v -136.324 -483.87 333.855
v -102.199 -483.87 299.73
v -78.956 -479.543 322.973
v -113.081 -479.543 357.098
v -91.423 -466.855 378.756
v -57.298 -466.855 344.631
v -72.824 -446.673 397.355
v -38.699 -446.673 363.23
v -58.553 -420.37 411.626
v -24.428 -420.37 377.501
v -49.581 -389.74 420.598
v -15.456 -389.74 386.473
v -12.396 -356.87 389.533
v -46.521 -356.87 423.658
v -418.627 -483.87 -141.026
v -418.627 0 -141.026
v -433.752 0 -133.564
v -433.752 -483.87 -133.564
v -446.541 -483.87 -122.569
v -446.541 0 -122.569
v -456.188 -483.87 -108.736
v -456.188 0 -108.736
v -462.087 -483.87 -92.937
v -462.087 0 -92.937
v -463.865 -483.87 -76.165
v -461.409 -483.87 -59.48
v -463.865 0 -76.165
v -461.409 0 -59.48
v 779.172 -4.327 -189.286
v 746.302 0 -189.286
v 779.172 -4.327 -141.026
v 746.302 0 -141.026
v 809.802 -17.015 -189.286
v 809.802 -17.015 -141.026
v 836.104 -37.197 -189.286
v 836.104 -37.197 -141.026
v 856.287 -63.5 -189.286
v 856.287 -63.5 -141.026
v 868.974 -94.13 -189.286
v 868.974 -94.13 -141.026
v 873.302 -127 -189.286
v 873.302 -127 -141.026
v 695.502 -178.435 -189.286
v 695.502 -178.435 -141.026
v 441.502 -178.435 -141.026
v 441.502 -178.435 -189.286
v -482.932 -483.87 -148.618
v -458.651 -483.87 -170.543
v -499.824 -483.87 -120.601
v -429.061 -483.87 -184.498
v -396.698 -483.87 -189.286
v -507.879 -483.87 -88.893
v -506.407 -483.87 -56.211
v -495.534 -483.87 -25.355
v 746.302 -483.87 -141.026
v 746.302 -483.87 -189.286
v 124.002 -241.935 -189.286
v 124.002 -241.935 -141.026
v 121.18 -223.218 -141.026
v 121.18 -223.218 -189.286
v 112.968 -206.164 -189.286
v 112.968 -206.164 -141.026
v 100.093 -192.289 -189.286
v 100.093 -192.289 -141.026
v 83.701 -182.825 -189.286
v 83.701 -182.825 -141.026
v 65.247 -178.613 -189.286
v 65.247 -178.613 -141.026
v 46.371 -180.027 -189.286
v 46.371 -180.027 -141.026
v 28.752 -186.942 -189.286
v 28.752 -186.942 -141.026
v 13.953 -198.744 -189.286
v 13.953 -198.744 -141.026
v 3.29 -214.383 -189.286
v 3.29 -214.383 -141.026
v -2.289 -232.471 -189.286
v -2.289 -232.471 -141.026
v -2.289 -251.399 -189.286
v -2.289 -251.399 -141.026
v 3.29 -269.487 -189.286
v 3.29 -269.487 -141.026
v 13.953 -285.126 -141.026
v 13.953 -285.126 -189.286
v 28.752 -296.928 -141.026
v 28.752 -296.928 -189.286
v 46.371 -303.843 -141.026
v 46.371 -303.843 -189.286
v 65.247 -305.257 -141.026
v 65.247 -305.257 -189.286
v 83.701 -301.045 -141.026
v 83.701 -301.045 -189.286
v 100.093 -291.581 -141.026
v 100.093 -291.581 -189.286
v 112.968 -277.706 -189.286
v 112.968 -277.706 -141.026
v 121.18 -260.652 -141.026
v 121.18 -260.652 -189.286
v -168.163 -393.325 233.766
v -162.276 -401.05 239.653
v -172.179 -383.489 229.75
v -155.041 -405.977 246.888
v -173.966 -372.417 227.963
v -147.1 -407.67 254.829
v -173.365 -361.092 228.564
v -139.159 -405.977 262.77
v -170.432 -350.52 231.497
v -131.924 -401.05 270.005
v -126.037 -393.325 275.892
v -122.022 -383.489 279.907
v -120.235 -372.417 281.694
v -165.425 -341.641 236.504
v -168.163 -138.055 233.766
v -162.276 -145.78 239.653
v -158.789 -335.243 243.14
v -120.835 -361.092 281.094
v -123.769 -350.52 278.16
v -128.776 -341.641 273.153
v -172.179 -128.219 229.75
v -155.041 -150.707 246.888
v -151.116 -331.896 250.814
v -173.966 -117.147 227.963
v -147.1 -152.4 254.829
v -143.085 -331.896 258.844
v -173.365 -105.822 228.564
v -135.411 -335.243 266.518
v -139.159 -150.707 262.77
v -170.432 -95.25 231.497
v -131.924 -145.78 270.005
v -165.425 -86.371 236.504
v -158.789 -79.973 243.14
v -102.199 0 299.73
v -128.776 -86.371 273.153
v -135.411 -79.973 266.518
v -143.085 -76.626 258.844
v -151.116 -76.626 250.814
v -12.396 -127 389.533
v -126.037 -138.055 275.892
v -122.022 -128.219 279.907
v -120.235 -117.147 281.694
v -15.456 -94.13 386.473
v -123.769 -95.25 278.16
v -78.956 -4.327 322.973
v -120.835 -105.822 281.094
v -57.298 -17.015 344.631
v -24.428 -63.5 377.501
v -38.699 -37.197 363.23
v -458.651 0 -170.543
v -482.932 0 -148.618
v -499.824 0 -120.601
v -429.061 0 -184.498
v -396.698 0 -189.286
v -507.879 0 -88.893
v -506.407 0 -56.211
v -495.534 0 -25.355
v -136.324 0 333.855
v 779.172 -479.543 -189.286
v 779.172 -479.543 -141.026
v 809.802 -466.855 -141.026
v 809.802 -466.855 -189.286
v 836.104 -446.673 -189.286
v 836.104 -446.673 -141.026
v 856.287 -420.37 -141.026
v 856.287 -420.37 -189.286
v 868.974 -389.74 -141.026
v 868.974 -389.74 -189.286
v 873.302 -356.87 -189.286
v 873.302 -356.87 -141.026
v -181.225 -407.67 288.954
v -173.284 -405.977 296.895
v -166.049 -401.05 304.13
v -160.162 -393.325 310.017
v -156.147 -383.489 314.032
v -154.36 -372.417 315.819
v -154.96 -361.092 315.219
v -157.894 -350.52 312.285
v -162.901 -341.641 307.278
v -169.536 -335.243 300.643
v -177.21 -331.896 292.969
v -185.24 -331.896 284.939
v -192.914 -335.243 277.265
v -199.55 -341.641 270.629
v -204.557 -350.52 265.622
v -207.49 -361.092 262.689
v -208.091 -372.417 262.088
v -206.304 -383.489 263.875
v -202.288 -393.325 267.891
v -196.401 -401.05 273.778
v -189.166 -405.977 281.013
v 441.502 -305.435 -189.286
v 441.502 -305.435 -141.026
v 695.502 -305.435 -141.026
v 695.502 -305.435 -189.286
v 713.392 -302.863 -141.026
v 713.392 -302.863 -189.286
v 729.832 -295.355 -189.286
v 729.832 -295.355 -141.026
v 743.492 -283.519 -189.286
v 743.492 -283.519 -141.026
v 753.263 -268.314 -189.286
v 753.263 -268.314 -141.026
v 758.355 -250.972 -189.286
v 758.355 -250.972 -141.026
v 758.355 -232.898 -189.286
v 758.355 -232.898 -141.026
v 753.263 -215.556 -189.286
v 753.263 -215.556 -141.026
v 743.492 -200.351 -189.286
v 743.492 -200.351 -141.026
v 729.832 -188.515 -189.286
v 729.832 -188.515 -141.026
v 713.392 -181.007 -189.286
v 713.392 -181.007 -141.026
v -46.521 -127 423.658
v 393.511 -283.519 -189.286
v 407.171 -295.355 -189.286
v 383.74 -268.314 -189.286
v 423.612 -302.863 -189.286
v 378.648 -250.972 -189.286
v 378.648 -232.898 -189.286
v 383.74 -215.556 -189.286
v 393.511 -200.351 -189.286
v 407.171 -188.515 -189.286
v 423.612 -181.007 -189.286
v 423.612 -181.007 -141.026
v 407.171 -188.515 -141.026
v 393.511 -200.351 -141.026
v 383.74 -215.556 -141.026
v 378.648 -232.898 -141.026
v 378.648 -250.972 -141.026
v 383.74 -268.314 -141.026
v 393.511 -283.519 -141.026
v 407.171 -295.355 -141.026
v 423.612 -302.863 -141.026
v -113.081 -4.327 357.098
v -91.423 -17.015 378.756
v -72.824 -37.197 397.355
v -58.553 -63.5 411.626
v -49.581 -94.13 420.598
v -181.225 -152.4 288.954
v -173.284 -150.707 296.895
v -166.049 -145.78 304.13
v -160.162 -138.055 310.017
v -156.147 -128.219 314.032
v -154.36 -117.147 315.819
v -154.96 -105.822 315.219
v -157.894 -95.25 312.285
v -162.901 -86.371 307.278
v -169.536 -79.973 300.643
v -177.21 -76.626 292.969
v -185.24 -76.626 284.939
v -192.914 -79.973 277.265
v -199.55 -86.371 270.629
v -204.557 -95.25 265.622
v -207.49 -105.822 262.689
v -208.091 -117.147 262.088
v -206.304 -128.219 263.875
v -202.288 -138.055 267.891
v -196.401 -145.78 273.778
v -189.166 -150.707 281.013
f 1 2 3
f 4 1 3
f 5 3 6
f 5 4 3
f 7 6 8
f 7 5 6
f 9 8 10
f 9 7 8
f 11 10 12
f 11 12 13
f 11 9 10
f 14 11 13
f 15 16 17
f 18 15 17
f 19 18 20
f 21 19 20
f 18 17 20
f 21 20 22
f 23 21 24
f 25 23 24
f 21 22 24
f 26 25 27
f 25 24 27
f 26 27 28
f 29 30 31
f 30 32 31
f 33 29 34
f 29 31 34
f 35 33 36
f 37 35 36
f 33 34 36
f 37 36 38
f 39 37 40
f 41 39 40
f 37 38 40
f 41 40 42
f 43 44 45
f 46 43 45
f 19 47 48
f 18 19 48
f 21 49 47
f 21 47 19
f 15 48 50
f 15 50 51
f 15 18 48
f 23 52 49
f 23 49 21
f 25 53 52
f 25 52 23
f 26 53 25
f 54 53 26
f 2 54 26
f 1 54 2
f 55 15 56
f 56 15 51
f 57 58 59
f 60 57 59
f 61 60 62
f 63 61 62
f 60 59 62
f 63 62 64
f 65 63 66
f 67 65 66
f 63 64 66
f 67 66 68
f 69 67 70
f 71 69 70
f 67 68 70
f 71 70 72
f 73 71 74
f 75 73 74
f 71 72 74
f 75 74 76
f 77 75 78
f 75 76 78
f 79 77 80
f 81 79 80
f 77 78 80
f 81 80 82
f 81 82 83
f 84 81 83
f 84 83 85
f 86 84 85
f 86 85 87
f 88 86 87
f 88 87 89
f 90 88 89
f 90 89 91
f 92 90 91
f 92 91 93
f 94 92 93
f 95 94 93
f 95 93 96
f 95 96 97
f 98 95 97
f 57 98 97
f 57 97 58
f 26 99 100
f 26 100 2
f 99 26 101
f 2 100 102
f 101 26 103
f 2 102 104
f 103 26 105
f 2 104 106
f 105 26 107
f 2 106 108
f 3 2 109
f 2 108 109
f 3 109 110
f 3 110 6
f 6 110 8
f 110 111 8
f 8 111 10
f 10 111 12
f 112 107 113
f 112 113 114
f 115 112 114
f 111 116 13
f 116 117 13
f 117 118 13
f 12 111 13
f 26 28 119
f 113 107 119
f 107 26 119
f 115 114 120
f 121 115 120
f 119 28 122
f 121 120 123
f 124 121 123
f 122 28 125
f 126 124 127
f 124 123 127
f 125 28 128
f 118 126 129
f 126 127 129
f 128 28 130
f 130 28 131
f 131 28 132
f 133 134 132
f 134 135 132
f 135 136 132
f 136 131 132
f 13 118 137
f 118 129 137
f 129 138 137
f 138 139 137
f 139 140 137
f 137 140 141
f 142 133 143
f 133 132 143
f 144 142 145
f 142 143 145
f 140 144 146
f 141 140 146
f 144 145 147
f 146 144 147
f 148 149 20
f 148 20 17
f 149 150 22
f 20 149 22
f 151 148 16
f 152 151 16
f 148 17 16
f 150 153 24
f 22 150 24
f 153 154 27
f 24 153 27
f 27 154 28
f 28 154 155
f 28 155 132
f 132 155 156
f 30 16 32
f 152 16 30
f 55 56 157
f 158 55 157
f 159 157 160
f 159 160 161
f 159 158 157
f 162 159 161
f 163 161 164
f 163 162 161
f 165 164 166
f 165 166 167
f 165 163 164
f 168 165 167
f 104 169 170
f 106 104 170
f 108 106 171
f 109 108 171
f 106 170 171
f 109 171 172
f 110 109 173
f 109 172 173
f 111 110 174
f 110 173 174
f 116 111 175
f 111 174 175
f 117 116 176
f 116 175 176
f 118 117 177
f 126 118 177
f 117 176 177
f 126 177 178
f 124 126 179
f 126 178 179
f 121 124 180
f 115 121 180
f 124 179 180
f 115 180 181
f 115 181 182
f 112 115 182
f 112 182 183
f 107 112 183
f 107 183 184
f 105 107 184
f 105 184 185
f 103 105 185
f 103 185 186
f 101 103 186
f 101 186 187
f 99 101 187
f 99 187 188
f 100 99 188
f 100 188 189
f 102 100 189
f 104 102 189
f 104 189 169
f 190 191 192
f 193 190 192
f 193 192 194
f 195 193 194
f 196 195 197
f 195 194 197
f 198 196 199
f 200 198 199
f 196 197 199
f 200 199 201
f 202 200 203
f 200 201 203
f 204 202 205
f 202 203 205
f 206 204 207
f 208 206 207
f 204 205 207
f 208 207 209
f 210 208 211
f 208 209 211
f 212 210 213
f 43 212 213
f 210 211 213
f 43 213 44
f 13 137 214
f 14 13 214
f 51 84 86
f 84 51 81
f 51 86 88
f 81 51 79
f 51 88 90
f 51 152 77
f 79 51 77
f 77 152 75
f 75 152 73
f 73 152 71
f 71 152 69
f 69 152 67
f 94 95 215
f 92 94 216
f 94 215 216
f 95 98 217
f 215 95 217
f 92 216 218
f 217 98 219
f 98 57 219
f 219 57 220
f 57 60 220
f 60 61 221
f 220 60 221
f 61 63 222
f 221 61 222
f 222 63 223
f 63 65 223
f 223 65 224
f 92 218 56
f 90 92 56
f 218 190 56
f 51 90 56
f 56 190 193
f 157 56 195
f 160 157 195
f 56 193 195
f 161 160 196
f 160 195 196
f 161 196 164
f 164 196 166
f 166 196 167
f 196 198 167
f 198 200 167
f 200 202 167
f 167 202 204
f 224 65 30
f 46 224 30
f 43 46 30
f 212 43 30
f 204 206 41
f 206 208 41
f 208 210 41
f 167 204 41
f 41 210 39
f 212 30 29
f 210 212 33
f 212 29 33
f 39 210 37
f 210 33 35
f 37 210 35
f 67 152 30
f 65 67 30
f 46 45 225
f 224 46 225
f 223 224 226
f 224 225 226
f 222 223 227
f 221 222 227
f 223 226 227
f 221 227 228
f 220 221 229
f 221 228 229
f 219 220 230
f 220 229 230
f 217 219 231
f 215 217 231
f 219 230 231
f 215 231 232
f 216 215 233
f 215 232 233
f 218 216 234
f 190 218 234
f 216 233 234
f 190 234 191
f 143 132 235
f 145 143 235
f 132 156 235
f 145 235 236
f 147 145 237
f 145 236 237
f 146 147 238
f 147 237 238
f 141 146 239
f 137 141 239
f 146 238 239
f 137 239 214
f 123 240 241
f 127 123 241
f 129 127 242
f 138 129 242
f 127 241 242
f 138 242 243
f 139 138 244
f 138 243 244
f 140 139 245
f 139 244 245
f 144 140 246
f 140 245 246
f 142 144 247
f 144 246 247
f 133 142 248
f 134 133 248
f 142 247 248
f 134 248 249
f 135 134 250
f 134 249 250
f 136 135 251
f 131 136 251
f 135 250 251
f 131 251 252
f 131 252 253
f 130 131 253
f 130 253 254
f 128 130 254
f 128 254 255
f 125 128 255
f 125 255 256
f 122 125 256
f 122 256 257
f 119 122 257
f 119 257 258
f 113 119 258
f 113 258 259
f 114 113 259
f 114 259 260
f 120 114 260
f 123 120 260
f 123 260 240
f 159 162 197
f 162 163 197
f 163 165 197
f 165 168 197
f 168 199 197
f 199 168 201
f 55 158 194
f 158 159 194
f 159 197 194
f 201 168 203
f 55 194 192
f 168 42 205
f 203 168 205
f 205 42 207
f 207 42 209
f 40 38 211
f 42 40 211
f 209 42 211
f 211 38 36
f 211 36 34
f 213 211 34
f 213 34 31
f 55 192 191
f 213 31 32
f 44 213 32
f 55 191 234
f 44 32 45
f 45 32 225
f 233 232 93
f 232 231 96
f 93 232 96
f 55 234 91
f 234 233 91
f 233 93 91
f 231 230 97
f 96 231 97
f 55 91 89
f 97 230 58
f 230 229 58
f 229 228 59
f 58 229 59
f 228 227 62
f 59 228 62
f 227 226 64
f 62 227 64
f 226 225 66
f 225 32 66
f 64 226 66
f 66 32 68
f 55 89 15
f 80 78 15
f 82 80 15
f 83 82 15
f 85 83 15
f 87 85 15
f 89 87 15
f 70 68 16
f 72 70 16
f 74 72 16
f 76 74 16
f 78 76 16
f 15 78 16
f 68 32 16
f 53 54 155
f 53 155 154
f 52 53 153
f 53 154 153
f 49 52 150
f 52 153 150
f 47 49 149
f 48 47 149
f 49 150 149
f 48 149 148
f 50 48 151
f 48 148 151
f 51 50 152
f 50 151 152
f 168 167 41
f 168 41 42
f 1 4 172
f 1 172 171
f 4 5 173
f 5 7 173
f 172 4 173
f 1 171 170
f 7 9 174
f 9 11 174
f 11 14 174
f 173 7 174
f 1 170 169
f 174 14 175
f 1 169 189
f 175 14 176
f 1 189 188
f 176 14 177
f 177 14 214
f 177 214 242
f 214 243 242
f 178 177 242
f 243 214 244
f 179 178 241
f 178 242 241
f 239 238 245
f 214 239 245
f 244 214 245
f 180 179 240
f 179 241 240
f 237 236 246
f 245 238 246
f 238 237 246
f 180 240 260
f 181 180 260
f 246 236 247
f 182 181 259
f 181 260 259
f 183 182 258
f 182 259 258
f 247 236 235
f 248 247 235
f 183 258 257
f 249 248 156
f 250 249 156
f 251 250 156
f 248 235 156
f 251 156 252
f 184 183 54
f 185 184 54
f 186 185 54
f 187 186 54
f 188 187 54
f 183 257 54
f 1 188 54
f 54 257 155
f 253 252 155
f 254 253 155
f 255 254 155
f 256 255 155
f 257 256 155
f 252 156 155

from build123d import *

# Parameters (mm, degrees)
F1_DEPTH = 483.87
F2_R     = 63.5
F3_DEPTH = 137.16
F4_R     = 127
F5_R     = 38.1
F6_DEPTH = 81.28
F7_R     = 127


with BuildPart() as f1:
    # F0 (on Front) → F1 (new body)
    with BuildSketch(Plane.XZ):
        with BuildLine():
            Line((-396.698482, -189.28613), (873.301518, -189.28613))
            Line((873.301518, -189.28613), (873.301518, -141.02613))
            Line((873.301518, -141.02613), (-418.627456, -141.02613))
            ThreePointArc((-418.627456, -141.02613), (-456.18836, -108.736454), (-461.409152, -59.480104))
            Line((-461.409152, -59.480104), (-12.396346, 389.532702))
            Line((-12.396346, 389.532702), (-46.521319, 423.657675))
            Line((-46.521319, 423.657675), (-495.534125, -25.355131))
            ThreePointArc((-495.534125, -25.355131), (-492.408796, -135.230838), (-396.698482, -189.28613))
        make_face()
    extrude(amount=F1_DEPTH)

    # F2 (on face) → F3 (cut)
    with BuildSketch(Plane.XY.offset(-141.02613)):
        with BuildLine():
            Line((441.501518, -305.435), (695.501518, -305.435))
            ThreePointArc((695.501518, -305.435), (759.001518, -241.935), (695.501518, -178.435))
            Line((695.501518, -178.435), (441.501518, -178.435))
            ThreePointArc((441.501518, -178.435), (378.001518, -241.935), (441.501518, -305.435))
        make_face()
        with Locations((60.501518, -241.935)):
            Circle(F2_R)
    extrude(amount=-F3_DEPTH, mode=Mode.SUBTRACT)

    # F4
    f4_edges = [f1.edges().sort_by_distance(p)[0] for p in [
        (873.301518, -483.87, -165.15613),
        (873.301518, 0, -165.15613),
    ]]
    fillet(f4_edges, radius=F4_R)

    # F5 (on face) → F6 (cut)
    with BuildSketch(Plane(origin=(-235.089497, 0, 235.089497), x_dir=(0, -1, 0), z_dir=(-0.707107, 0, 0.707107))):
        with Locations((369.57, 76.175675)):
            Circle(F5_R)
        with Locations((114.3, 76.175675)):
            Circle(F5_R)
    extrude(amount=-F6_DEPTH, mode=Mode.SUBTRACT)

    # F7
    f7_edges = [f1.edges().sort_by_distance(p)[0] for p in [
        (-29.458833, -483.87, 406.595189),
        (-29.458833, 0, 406.595189),
    ]]
    fillet(f7_edges, radius=F7_R)


solid = f1.part
